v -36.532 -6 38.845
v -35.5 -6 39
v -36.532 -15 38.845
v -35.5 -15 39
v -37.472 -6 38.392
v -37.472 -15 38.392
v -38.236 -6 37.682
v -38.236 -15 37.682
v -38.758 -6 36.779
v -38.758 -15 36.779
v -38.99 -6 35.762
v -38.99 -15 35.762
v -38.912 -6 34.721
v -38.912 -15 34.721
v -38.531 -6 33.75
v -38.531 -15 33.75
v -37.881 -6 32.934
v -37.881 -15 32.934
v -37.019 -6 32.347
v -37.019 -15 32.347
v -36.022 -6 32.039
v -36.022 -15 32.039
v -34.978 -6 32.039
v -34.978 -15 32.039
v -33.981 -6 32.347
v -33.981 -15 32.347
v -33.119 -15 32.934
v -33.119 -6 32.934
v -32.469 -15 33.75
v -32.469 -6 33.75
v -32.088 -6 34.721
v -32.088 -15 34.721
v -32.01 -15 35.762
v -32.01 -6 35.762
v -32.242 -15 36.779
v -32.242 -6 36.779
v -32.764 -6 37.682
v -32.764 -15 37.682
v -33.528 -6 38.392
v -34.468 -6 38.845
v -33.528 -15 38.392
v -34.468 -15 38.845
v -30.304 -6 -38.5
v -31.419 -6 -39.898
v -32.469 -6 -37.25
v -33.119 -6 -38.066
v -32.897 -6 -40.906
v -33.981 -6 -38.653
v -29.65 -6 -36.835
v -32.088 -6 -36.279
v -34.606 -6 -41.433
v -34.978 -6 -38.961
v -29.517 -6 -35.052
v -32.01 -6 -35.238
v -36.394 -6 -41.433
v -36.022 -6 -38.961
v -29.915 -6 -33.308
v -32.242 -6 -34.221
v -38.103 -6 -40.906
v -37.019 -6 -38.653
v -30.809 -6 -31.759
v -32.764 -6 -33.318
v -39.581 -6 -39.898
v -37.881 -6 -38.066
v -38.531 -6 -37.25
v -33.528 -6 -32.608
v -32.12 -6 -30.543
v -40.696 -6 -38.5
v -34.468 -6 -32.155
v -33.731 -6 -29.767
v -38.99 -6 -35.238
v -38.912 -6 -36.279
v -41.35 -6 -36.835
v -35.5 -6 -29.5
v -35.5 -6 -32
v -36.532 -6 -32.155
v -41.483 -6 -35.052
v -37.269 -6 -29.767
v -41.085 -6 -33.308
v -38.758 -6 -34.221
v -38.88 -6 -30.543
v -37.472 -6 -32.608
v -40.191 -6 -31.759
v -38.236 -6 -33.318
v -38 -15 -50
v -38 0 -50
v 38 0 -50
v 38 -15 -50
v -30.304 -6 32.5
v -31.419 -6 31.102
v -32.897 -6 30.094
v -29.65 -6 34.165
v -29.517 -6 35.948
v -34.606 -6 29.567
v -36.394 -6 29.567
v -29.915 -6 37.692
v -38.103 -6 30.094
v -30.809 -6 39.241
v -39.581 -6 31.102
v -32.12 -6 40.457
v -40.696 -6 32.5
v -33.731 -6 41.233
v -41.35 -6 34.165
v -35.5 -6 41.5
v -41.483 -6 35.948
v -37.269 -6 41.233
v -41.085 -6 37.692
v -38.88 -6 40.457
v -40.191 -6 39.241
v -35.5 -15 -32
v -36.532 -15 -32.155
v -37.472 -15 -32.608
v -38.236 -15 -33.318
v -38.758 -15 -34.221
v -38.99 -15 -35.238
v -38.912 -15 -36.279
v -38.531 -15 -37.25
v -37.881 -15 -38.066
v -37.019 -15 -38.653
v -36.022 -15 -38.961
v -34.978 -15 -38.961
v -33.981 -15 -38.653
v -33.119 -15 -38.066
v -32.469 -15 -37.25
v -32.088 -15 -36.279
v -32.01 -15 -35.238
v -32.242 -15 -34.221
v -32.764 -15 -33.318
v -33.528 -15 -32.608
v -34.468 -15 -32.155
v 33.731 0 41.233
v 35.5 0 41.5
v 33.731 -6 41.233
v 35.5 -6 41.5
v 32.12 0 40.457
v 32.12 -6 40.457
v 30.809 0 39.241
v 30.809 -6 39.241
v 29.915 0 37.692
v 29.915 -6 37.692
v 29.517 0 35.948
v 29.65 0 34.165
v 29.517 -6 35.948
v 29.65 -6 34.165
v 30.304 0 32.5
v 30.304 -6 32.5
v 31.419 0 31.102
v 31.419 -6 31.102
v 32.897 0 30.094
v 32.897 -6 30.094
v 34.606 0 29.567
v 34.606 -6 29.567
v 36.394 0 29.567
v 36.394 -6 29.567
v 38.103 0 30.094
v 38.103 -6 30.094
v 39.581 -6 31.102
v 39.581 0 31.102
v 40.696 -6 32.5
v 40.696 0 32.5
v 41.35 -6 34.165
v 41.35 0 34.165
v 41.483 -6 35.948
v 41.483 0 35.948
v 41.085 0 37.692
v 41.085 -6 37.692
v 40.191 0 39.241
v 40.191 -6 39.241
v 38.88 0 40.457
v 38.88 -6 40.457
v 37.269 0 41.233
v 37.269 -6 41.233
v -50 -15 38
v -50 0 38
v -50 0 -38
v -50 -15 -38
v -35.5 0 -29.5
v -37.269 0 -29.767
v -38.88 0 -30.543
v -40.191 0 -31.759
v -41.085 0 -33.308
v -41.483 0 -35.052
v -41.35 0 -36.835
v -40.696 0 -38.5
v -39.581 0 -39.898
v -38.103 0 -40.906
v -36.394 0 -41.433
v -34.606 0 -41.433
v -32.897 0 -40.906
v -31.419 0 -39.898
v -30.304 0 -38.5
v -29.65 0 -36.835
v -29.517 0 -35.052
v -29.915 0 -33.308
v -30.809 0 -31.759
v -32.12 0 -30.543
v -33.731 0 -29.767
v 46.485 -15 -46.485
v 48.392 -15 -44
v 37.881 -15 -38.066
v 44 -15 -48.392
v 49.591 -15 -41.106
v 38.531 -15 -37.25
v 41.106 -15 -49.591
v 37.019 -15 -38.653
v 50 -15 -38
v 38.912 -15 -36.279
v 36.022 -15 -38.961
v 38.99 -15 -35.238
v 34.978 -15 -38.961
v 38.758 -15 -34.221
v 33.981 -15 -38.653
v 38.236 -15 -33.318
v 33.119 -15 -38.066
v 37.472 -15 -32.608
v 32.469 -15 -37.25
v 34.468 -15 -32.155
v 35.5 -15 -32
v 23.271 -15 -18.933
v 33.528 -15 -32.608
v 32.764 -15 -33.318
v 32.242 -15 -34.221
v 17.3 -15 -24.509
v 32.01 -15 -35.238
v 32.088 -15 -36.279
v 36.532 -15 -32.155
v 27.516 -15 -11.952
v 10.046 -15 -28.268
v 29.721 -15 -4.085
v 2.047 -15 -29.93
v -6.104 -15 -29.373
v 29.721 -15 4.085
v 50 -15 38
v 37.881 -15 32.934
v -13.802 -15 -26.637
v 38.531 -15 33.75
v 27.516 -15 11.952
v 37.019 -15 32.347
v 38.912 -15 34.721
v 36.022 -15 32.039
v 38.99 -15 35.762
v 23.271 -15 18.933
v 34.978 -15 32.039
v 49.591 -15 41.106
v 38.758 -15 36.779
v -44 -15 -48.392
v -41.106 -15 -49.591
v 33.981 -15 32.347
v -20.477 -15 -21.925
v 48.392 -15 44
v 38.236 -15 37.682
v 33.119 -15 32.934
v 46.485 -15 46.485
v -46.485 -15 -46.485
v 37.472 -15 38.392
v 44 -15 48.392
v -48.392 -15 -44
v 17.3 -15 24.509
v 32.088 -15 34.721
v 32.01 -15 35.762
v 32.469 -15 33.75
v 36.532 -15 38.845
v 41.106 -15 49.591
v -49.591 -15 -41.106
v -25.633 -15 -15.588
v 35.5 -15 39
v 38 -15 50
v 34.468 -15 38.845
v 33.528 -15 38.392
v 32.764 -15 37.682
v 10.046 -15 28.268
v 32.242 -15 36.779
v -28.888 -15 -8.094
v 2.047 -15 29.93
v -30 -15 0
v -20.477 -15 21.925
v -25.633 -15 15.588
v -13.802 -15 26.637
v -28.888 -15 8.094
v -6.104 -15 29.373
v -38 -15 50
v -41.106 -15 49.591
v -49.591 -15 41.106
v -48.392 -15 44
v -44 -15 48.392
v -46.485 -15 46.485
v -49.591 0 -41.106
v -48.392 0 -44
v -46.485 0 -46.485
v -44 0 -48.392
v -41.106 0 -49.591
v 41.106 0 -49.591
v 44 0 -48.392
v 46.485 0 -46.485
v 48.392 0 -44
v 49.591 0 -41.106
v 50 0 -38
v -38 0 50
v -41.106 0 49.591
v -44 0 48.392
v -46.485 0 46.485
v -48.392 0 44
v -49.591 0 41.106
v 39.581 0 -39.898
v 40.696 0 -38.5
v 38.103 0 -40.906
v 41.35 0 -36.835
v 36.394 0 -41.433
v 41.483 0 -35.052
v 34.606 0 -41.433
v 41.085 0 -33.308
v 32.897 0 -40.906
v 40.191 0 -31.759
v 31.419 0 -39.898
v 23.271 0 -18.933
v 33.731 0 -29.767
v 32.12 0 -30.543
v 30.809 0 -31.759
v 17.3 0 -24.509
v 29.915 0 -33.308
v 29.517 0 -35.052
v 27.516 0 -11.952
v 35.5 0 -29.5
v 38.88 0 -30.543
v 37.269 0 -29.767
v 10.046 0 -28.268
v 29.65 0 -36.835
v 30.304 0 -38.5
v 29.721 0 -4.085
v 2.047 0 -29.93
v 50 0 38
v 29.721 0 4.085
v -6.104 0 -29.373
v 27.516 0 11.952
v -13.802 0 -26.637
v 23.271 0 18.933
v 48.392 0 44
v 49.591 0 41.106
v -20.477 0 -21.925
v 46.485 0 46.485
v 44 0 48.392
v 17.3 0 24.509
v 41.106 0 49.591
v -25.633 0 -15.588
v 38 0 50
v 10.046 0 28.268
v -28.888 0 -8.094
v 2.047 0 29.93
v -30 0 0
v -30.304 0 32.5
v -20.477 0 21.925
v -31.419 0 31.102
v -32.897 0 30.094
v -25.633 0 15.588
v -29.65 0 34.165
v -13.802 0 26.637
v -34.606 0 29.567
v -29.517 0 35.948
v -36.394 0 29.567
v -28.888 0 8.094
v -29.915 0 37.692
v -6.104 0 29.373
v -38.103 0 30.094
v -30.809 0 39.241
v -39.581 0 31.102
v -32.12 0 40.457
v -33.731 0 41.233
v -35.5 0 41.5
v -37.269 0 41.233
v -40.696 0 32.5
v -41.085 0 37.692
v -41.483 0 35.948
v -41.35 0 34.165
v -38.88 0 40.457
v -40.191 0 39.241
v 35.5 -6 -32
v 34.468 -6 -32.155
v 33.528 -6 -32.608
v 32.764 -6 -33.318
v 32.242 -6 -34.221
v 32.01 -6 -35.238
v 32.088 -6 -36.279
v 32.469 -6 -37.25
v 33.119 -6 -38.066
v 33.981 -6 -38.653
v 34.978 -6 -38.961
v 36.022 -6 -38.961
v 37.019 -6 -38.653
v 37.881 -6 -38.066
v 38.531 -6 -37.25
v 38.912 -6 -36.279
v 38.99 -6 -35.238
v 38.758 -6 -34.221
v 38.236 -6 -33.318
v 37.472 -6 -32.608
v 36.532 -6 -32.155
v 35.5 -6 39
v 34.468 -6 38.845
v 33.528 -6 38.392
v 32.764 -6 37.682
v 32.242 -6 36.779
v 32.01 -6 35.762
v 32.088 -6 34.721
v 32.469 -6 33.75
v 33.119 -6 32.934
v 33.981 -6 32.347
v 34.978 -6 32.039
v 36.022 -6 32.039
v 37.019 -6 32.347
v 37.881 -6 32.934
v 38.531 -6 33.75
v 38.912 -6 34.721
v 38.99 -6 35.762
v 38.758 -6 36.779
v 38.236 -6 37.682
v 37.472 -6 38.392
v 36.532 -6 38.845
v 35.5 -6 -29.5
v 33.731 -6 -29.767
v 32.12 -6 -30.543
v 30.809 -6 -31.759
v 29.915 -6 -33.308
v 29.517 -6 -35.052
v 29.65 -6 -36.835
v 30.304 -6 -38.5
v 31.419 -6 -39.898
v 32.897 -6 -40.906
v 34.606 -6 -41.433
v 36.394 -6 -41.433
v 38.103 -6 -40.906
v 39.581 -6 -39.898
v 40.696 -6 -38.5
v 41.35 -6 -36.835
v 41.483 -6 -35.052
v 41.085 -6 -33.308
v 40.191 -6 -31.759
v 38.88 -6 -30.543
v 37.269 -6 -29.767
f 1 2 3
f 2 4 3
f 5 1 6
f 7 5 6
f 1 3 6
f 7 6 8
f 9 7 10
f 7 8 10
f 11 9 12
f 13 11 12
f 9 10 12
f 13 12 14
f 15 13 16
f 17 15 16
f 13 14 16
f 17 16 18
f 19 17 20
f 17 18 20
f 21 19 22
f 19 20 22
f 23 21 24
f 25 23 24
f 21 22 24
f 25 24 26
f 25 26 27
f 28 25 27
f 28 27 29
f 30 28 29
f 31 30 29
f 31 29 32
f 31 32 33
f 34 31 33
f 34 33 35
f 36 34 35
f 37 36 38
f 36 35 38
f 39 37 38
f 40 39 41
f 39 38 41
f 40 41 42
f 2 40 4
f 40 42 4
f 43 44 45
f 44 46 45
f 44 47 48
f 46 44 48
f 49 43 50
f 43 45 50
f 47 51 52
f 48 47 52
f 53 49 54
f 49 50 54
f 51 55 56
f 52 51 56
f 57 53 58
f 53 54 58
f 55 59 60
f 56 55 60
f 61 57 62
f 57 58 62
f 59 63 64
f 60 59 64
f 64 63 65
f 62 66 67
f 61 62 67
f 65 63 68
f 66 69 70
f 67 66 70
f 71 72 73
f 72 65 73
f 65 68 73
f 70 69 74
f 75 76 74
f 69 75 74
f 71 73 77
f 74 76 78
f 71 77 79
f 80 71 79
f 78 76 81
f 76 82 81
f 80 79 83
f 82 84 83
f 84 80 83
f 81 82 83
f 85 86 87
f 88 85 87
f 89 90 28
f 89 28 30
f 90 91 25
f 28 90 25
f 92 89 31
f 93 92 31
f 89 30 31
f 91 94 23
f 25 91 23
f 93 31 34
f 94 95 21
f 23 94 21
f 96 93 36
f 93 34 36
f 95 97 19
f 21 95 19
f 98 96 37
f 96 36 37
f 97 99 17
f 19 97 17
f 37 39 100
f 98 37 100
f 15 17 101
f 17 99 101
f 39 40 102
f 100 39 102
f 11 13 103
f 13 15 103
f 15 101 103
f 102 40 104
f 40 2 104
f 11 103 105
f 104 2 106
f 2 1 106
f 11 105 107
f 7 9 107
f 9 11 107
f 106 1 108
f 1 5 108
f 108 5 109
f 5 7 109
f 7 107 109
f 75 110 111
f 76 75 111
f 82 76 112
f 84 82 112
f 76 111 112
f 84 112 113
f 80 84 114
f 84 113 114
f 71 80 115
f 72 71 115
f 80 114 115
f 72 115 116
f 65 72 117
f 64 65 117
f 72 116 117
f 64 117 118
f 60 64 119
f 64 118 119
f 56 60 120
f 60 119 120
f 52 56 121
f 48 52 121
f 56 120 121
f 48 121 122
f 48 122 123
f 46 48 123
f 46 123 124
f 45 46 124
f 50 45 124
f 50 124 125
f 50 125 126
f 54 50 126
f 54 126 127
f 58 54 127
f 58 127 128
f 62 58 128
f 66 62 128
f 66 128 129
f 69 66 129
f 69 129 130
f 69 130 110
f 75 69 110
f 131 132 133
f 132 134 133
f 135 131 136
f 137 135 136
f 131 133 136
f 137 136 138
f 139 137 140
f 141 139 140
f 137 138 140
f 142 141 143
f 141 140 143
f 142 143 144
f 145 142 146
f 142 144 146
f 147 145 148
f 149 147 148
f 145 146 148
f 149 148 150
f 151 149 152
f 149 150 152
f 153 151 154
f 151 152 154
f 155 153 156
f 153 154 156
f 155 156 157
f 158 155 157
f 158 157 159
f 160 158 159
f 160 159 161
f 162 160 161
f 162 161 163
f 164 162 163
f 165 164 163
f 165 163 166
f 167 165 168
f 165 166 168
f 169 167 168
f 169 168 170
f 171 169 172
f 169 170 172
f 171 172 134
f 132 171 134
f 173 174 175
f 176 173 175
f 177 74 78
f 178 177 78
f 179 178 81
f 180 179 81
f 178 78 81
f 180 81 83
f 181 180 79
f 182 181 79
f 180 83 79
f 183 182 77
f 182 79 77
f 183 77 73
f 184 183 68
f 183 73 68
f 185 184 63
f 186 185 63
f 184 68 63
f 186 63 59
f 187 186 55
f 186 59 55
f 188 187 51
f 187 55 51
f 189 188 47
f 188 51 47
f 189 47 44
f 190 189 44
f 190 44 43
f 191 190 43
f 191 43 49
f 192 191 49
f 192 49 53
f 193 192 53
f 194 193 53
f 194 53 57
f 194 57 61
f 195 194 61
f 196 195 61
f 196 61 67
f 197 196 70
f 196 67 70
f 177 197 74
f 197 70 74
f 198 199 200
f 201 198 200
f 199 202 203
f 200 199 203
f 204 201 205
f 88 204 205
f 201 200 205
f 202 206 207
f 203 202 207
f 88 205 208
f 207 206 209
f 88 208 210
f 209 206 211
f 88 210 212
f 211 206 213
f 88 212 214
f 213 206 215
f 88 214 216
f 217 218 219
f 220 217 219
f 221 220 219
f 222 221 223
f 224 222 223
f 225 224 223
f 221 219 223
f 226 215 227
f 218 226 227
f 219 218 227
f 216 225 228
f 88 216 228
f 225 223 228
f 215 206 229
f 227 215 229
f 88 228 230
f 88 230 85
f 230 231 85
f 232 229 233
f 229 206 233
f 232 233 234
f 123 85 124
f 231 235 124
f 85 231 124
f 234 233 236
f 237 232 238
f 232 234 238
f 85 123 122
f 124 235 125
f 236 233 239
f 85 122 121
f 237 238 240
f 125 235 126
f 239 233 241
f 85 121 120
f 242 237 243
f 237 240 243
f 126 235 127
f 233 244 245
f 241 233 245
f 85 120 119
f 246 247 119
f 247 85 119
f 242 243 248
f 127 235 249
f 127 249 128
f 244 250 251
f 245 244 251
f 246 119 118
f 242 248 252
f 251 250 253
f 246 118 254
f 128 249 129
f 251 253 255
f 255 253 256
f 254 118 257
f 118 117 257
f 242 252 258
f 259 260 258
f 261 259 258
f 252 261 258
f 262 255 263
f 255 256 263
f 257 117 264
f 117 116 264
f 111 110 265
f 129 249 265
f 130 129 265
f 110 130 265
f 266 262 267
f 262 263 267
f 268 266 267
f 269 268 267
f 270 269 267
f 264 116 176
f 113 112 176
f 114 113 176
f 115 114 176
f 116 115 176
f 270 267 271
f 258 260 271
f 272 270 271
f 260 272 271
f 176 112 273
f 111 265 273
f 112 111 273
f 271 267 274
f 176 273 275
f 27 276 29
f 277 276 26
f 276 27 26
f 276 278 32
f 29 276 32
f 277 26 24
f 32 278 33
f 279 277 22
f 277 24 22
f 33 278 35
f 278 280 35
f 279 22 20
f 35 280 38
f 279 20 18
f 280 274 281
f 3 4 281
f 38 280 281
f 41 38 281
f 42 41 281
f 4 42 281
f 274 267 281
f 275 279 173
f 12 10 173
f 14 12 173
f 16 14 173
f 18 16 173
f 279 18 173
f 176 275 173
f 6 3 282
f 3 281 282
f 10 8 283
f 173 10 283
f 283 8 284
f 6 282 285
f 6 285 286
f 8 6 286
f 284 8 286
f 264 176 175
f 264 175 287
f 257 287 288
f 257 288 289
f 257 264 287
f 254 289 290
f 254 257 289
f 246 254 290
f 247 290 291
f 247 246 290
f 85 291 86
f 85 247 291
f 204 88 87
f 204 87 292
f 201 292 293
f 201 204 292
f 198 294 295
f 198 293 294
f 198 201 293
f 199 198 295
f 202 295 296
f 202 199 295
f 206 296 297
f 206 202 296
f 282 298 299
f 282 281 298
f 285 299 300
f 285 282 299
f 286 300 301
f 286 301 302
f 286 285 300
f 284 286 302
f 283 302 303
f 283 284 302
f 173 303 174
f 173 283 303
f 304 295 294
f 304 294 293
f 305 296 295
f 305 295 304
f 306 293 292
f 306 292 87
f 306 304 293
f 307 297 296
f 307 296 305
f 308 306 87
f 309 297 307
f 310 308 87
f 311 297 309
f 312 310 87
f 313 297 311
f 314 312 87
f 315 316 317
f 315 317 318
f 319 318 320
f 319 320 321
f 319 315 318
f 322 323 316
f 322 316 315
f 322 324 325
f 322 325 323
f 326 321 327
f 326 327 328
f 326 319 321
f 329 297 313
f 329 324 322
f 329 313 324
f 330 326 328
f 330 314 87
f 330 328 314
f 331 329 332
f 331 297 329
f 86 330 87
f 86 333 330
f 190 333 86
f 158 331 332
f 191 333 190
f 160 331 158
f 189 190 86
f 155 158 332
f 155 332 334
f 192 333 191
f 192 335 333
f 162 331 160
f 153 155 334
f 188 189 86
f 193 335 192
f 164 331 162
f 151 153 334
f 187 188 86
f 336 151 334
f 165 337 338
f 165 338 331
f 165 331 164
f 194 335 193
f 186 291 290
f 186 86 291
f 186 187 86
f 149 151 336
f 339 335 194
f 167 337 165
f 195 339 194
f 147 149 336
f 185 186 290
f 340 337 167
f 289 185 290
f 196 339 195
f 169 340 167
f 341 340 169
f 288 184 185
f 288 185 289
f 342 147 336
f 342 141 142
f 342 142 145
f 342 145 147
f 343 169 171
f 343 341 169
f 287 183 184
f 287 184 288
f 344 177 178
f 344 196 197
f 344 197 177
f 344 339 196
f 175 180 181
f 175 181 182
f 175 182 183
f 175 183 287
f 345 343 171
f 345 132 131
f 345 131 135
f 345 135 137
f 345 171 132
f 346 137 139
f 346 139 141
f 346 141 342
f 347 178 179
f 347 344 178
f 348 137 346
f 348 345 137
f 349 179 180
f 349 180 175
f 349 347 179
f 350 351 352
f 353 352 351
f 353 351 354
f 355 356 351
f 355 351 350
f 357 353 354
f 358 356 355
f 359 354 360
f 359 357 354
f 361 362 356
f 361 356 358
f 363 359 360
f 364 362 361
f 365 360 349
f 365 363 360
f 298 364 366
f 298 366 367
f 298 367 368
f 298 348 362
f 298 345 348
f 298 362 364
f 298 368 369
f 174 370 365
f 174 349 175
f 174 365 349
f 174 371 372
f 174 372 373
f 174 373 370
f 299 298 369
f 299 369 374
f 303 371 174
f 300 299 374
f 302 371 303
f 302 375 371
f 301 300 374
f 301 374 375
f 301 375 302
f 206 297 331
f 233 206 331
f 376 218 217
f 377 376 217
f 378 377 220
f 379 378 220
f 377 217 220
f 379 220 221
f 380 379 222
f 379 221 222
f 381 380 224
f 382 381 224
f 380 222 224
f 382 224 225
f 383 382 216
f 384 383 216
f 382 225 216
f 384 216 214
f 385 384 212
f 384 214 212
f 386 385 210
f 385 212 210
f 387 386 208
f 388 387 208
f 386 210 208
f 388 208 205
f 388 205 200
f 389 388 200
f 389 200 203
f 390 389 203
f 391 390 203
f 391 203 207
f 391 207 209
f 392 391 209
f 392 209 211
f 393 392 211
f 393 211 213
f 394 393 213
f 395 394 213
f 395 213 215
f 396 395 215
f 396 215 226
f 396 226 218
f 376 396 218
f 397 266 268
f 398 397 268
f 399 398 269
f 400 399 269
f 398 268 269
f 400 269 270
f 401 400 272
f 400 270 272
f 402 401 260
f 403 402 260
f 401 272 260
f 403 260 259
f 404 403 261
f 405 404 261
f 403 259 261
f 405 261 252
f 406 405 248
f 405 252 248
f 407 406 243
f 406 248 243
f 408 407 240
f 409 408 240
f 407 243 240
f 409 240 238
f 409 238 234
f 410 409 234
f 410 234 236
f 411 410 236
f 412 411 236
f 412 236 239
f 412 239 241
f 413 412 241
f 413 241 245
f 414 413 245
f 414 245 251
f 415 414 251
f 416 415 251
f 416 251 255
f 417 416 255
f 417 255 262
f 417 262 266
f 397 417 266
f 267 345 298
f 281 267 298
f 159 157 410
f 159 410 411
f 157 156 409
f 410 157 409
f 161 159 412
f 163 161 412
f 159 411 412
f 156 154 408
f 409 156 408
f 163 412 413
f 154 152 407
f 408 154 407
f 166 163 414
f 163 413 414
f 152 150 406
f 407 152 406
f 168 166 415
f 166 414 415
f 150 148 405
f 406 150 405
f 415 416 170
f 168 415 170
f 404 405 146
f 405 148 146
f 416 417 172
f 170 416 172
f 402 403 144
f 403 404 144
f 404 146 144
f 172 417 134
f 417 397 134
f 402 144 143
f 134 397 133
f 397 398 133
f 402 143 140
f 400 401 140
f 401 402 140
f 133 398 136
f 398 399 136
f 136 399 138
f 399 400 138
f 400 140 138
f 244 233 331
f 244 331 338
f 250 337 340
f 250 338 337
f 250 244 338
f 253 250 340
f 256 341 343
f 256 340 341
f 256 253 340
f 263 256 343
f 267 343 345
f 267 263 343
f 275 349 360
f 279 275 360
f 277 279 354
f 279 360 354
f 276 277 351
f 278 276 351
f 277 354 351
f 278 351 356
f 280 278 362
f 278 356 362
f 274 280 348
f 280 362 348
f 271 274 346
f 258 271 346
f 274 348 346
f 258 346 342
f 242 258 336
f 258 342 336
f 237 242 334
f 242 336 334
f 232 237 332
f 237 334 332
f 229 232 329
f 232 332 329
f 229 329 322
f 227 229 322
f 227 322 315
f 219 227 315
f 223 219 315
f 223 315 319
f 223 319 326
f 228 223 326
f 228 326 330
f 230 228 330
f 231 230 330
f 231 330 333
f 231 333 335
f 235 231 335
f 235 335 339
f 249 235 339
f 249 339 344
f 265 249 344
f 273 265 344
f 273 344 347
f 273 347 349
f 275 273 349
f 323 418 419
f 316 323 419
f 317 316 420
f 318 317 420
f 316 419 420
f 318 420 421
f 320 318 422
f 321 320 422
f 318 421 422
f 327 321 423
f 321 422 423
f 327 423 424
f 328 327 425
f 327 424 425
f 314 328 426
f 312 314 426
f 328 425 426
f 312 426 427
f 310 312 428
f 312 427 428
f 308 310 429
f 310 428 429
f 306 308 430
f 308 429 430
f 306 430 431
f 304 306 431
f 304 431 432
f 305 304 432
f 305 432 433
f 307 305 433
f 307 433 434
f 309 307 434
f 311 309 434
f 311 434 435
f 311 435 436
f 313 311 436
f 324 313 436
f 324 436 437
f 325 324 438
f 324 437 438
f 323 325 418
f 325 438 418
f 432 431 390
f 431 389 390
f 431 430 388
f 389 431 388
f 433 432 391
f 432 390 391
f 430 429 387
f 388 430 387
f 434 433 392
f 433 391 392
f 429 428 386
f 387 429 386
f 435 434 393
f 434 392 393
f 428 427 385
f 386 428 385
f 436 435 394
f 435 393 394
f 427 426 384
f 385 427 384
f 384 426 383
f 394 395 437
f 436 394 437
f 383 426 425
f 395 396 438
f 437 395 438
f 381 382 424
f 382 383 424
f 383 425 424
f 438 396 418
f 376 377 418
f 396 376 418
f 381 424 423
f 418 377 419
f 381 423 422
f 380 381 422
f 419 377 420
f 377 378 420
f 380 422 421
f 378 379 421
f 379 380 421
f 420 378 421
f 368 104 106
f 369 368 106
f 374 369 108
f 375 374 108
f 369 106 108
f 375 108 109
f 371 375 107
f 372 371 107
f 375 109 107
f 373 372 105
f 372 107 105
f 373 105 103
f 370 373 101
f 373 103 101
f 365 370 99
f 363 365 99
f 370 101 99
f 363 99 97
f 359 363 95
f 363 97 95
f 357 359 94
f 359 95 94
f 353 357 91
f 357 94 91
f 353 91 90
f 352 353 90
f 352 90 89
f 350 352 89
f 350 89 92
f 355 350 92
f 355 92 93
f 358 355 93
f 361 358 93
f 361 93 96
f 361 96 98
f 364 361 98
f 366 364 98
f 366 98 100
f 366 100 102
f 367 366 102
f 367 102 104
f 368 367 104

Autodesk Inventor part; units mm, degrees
ref_plane "YZ Plane" through (0, 0, 0) normal (1, 0, 0) x (0, 1, 0)
ref_plane "XZ Plane" through (0, 0, 0) normal (0, 1, 0) x (-1, 0, 0)
ref_plane "XY Plane" through (0, 0, 0) normal (0, 0, 1) x (1, 0, 0)
sketch "Sketch1" plane through (0, 0, 0) normal (0, 1, 0) x (-1, 0, 0)
  line L0 (-50, 50) -> (50, 50)
  line L1 (50, 50) -> (50, -50)
  line L2 (50, -50) -> (-50, -50)
  line L3 (-50, -50) -> (-50, 50)
  line L4 (-50, 50) -> (50, -50) construction
  line L5 (50, 50) -> (-50, -50) construction
  circle A0 centre (0, 0) radius 30
  line L6 (-35.5, 35.5) -> (35.5, 35.5) construction
  line L7 (35.5, 35.5) -> (35.5, -35.5) construction
  line L8 (35.5, -35.5) -> (-35.5, -35.5) construction
  line L9 (-35.5, -35.5) -> (-35.5, 35.5) construction
  line L10 (-35.5, 35.5) -> (35.5, -35.5) construction
  line L11 (35.5, 35.5) -> (-35.5, -35.5) construction
  dimension "d0" = 100
  dimension "d1" = 60
  dimension "d2" = 71
  dimension "d13" = 100.4092
extrude "Extrusion1" add sketch "Sketch1" against normal blind 15
hole "Hole1" at (-35.5, 0, -35.5) at (35.5, 0, -35.5) at (35.5, 0, 35.5) at (-35.5, 0, 35.5) direction (0, -1, 0) diameter 7 end through all counterbore diameter 12 counterbore depth 6
fillet "Fillet1" radius 12 4 edges at (-50, -7.5, -50) (50, -7.5, -50) (50, -7.5, 50) (-50, -7.5, 50)
properties part number "MP1-001" material "Wood (Birch)"
